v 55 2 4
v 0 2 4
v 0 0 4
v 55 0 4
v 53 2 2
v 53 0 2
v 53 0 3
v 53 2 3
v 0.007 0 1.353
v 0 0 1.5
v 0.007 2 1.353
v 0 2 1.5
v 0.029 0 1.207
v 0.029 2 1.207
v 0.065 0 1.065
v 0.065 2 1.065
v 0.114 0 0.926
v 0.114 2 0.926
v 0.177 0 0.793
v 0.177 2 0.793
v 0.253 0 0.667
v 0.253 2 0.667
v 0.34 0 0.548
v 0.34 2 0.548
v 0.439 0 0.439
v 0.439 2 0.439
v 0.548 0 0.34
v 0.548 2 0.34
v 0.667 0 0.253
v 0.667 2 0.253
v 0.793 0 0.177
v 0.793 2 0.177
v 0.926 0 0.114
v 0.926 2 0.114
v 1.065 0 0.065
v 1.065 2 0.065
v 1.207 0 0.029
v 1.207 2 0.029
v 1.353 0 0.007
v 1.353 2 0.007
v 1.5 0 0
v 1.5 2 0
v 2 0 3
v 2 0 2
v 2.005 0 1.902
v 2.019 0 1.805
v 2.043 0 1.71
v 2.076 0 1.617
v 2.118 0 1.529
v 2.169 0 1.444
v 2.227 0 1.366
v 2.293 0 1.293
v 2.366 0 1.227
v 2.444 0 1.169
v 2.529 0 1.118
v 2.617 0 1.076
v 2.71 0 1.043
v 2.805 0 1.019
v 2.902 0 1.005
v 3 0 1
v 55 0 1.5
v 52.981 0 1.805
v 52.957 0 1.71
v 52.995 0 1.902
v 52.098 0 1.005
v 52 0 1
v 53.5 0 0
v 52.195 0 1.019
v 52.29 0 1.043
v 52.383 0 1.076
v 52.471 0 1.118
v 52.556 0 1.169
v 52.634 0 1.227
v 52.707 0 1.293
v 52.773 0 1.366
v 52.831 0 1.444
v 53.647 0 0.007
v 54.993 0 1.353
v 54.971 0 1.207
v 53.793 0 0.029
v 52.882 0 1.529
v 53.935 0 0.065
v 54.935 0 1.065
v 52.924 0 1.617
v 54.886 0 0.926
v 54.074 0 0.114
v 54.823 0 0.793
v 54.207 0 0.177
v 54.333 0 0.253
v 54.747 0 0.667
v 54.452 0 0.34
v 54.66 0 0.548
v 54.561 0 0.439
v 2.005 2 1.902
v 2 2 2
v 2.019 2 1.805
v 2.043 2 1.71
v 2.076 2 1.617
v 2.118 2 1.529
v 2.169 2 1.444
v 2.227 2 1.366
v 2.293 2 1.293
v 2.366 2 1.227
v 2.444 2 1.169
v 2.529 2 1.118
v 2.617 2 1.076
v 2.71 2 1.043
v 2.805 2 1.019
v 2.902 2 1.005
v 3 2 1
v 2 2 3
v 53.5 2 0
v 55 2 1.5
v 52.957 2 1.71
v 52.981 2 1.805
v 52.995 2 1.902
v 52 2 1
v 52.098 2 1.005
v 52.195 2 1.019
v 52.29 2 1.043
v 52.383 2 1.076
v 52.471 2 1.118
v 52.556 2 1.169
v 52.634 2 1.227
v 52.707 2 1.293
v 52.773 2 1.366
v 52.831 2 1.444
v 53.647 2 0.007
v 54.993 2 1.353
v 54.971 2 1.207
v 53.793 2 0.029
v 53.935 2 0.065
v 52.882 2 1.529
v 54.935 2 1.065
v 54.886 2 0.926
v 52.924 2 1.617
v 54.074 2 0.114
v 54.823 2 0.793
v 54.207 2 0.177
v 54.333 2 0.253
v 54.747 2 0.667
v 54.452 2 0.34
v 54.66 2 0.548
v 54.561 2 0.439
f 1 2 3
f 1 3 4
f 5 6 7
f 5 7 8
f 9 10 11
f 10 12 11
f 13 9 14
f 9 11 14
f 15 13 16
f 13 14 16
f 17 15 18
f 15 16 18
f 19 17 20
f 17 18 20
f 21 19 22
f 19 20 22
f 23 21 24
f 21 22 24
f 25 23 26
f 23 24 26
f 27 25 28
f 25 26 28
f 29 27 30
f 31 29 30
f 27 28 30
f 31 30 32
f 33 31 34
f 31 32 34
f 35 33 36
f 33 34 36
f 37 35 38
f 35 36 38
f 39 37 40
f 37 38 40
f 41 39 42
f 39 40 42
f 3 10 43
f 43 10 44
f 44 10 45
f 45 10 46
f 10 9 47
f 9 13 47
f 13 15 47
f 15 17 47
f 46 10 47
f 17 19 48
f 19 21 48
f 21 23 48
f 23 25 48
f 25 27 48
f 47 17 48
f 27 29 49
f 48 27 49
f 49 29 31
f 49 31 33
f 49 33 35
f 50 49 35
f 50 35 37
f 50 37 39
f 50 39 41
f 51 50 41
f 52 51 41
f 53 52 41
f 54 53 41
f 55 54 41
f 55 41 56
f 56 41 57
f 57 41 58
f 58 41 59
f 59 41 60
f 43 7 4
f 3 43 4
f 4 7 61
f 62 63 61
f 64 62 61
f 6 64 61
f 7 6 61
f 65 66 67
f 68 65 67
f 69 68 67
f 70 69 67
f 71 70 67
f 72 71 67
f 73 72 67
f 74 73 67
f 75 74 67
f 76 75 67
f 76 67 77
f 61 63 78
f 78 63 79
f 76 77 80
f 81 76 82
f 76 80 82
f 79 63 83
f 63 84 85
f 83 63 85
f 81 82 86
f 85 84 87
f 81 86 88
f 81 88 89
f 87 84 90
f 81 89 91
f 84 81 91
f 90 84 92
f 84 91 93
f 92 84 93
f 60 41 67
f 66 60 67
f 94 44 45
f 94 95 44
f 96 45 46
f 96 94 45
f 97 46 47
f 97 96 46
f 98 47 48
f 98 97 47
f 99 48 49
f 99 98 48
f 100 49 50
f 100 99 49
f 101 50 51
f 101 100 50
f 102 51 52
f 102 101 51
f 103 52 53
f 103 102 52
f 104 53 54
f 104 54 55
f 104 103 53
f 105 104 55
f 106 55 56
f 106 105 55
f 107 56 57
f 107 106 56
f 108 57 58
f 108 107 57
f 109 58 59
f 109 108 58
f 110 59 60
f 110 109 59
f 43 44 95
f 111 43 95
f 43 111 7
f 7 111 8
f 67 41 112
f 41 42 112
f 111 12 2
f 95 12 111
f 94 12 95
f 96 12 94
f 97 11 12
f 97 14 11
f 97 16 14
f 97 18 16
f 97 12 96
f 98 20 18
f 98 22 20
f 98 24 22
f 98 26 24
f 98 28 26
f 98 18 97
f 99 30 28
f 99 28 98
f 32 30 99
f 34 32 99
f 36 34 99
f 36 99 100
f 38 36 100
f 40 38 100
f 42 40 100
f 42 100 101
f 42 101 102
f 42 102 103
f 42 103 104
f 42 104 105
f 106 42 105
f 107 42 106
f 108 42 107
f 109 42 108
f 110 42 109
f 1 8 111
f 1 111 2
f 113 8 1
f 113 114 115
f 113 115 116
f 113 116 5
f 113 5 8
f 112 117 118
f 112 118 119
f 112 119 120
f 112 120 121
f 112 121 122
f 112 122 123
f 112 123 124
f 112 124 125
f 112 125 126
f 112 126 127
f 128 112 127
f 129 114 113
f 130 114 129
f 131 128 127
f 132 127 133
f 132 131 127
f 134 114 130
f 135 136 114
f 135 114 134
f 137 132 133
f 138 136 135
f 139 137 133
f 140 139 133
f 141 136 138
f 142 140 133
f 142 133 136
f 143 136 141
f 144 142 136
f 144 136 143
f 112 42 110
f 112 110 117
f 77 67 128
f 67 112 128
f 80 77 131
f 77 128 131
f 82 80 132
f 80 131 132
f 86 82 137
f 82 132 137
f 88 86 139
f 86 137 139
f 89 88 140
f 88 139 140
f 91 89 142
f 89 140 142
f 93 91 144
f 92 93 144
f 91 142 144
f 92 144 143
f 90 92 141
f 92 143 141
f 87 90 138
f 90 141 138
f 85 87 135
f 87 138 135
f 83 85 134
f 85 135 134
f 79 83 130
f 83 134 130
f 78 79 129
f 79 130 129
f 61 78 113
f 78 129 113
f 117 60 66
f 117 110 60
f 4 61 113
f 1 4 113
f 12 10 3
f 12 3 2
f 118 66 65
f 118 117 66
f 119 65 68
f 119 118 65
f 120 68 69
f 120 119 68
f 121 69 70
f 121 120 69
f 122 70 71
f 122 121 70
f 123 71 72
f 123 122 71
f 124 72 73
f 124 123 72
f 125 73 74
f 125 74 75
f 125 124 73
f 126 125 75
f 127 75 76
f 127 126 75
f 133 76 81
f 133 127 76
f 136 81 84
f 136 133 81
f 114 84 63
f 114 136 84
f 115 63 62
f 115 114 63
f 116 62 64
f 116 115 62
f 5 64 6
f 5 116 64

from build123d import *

# Parameters (mm, degrees)
BOX001_W     = 51
BOX001_H     = 2
BOX001_DEPTH = 2
BOX_W        = 55
BOX_H        = 2
BOX_DEPTH    = 4
FILLET_R     = 1.5
FILLET001_R  = 1
FILLET002_R  = 1


with BuildPart() as cube001:
    # Box001 → Box001 (new body)
    with BuildSketch(Plane(origin=(2, 0, 1), x_dir=(1, 0, 0), z_dir=(0, 0, 1))):
        with Locations((25.5, 1)):
            Rectangle(BOX001_W, BOX001_H)
    extrude(amount=BOX001_DEPTH)


with BuildPart() as fillet002:
    # Box → Box (new body)
    with BuildSketch(Plane.XY):
        with Locations((27.5, 1)):
            Rectangle(BOX_W, BOX_H)
    extrude(amount=BOX_DEPTH)

    # Cut: cut Cube001
    add(cube001.part, mode=Mode.SUBTRACT)

    # Fillet
    fillet_edges = [fillet002.edges().sort_by_distance(p)[0] for p in [
        (0, 1, 0),
        (55, 1, 0),
    ]]
    fillet(fillet_edges, radius=FILLET_R)

    # Fillet001
    fillet001_edges = [fillet002.edges().sort_by_distance(p)[0] for p in [
        (2, 1, 1),
    ]]
    fillet(fillet001_edges, radius=FILLET001_R)

    # Fillet002
    fillet002_edges = [fillet002.edges().sort_by_distance(p)[0] for p in [
        (53, 1, 1),
    ]]
    fillet(fillet002_edges, radius=FILLET002_R)


solid = fillet002.part
